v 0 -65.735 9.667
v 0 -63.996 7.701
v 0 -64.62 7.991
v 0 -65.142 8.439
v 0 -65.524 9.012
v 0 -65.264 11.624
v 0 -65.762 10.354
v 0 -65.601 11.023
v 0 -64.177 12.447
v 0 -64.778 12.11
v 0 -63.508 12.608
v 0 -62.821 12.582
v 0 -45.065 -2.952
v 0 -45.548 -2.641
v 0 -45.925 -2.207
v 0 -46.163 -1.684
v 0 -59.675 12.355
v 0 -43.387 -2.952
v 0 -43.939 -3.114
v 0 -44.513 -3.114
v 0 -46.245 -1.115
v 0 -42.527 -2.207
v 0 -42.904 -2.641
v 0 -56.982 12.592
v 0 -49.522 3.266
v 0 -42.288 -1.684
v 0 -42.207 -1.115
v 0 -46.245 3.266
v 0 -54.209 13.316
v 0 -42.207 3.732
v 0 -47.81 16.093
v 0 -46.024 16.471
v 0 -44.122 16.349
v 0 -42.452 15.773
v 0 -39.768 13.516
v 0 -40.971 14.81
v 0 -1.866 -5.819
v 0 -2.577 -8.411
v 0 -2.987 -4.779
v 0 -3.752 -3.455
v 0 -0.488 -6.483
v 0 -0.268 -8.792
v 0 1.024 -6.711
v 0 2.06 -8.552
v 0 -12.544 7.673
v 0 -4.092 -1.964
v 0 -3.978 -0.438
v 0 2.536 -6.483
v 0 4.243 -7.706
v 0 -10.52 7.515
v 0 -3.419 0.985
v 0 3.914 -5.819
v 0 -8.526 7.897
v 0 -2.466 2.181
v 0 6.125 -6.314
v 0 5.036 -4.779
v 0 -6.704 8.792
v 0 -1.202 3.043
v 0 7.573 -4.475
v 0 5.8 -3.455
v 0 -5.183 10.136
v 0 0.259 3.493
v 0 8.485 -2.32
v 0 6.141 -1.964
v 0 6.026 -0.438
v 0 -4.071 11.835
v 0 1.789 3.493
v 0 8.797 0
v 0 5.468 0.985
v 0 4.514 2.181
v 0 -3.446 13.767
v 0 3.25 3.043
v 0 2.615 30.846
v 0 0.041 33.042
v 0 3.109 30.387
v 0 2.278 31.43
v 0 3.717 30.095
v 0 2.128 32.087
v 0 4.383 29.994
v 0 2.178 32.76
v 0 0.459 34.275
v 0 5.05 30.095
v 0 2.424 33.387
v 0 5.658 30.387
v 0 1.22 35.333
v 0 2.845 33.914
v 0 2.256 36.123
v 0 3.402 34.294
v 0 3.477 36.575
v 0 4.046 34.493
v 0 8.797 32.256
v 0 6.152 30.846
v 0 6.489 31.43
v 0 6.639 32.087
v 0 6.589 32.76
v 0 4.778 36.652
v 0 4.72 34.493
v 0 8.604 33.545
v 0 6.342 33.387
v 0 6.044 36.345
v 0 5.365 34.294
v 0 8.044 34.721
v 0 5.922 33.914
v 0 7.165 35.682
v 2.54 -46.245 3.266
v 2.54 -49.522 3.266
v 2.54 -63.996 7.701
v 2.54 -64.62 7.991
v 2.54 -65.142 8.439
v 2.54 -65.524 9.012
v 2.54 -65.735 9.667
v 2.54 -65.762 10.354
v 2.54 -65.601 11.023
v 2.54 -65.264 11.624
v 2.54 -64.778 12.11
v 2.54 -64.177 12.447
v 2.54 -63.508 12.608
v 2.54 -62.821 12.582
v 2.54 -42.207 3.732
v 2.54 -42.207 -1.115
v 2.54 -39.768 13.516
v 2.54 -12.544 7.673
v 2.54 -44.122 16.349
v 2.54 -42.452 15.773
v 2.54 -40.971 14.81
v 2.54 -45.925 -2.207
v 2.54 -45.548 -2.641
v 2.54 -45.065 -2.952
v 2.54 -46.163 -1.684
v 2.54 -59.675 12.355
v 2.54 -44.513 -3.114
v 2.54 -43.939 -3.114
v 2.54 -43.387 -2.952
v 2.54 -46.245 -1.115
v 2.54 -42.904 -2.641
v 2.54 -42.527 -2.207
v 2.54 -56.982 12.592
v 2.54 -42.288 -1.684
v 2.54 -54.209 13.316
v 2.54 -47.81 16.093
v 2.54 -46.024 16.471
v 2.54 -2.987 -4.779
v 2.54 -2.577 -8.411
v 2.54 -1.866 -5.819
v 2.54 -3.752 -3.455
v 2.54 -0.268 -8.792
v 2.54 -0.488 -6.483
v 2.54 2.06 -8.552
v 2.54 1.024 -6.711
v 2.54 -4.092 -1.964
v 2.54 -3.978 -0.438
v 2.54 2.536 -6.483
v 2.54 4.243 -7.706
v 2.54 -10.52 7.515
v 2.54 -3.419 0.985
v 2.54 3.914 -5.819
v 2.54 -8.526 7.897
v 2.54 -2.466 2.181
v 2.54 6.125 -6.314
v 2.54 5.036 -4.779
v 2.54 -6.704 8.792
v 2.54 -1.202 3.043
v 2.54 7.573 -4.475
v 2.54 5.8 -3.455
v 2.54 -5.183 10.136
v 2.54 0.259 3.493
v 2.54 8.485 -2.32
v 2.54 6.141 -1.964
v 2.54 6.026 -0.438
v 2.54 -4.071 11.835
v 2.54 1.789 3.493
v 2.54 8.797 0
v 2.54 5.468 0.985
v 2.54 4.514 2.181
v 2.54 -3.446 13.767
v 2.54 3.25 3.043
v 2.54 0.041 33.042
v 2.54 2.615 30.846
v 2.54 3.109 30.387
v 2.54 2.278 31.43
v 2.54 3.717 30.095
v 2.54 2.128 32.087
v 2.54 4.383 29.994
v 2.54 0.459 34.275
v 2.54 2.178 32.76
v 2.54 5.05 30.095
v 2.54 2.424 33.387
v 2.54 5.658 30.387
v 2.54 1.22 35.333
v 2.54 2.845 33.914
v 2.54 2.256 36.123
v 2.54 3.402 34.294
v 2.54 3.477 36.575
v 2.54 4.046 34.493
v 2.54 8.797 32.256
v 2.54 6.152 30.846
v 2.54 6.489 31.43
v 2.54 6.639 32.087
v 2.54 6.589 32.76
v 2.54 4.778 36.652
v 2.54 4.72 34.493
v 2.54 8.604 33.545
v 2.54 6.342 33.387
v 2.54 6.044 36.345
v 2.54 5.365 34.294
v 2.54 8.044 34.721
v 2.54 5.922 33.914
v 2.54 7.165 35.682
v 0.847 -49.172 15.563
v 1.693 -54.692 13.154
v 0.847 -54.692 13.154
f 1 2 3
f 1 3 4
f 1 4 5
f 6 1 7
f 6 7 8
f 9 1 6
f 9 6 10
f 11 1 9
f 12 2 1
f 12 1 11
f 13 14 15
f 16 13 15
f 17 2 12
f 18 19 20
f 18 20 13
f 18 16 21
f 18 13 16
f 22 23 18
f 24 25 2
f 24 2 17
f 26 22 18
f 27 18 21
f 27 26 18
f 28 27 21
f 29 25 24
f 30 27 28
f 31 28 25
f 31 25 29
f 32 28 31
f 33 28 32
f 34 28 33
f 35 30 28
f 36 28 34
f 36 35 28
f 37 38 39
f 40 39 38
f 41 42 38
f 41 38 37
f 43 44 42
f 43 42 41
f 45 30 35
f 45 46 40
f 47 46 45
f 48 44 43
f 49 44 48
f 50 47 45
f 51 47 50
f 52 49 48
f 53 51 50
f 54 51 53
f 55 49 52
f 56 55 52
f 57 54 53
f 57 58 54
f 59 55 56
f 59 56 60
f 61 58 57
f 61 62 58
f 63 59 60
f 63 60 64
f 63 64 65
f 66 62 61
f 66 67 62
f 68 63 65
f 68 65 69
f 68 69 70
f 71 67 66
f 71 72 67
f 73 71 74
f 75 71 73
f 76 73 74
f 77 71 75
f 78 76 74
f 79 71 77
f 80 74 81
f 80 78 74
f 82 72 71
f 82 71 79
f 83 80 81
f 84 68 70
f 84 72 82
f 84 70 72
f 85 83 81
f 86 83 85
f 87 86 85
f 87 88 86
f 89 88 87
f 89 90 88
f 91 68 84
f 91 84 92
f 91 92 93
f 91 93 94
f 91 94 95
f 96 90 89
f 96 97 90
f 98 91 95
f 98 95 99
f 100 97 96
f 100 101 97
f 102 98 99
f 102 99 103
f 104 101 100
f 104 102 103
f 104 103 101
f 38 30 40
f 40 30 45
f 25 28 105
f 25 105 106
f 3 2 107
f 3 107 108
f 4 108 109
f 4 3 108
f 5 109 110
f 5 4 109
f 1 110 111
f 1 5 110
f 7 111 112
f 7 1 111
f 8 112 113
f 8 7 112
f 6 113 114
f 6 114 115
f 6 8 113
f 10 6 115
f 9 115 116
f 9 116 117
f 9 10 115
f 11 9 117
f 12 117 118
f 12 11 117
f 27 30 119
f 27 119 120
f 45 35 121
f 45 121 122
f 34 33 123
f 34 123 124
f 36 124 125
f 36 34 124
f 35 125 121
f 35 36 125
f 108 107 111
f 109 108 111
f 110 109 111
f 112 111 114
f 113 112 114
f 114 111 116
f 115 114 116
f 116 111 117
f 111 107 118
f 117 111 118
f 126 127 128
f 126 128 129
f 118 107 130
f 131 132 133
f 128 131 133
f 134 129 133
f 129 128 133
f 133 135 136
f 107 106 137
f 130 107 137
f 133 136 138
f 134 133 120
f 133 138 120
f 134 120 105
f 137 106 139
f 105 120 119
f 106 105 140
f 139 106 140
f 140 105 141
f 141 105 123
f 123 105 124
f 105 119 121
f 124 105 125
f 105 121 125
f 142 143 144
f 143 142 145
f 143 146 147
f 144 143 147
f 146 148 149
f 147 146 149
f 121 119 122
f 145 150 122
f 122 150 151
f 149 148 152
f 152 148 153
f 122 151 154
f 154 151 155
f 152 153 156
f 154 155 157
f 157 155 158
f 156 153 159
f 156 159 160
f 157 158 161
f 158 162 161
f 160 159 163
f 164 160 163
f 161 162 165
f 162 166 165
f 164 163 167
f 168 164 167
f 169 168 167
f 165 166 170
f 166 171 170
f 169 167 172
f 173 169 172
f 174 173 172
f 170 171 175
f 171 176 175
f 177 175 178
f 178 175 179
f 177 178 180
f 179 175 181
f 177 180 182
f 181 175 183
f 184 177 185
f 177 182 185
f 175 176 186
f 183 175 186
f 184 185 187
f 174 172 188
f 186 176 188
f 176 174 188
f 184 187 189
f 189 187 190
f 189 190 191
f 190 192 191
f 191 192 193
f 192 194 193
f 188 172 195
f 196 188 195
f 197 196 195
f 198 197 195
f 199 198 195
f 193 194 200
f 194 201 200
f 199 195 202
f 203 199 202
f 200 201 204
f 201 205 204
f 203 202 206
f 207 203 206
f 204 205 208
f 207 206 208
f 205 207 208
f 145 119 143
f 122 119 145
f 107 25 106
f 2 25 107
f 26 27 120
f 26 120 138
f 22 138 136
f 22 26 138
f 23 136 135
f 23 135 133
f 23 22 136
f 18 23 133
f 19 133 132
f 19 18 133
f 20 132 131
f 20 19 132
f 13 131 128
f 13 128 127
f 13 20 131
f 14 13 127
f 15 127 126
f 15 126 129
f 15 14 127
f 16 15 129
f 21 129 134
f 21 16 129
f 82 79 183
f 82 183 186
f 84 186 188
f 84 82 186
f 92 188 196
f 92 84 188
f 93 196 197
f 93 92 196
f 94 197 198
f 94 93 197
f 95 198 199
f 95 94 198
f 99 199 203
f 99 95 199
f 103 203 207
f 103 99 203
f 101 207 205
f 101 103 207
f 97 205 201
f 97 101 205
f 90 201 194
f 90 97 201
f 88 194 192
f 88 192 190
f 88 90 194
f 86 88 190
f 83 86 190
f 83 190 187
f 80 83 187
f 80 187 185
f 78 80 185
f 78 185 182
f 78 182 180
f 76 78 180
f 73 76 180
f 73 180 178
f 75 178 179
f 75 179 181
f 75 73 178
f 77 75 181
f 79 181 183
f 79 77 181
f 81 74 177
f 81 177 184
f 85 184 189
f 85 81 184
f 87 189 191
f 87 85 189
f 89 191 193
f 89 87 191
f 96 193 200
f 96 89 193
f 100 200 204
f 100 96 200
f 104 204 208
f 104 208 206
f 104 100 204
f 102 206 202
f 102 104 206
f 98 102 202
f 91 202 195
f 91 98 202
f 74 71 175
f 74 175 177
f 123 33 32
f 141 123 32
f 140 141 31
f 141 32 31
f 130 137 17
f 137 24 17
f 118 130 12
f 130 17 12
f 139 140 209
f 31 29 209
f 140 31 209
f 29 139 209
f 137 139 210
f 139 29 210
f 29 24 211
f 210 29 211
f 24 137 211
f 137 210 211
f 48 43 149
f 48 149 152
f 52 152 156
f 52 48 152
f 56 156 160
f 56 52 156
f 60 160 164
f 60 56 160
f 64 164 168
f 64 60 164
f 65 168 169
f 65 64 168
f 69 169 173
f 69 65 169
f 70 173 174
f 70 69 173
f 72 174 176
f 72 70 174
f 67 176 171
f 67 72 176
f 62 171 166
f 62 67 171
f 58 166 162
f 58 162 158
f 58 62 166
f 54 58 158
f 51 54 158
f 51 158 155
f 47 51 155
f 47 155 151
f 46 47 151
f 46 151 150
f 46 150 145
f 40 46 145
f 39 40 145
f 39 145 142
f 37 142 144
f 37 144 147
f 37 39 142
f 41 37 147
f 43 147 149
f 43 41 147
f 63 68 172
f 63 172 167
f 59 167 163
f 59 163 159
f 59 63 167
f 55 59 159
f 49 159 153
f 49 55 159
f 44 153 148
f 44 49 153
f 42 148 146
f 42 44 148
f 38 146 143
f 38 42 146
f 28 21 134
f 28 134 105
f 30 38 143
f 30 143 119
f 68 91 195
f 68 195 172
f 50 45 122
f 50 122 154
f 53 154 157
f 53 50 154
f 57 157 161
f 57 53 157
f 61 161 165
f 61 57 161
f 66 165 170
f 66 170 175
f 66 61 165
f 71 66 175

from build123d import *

# Parameters (mm, degrees)
SKETCH1_R           = 5.1308
SKETCH1_R_2         = 2.262010882
BOSS_EXTRUDE1_DEPTH = 2.54


with BuildPart() as part:
    # Sketch1 → Boss-Extrude1 (new body)
    with BuildSketch(Plane(origin=(0, 0, 0), x_dir=(0, 0, -1), z_dir=(1, 0, 0))):
        with BuildLine():
            Line((-32.256192364, 8.796557636), (0, 8.796557636))
            ThreePointArc((0, 8.796557636), (7.072772121, 5.230231425), (8.410616185, -2.577006332))
            Line((8.410616185, -2.577006332), (-3.731873822, -42.206642364))
            Line((-3.731873822, -42.206642364), (1.115138458, -42.206642364))
            ThreePointArc((1.115138458, -42.206642364), (3.134438458, -44.225942364), (1.115138458, -46.245242364))
            Line((1.115138458, -46.245242364), (-3.266361542, -46.245242364))
            Line((-3.266361542, -46.245242364), (-3.266361542, -49.521842364))
            Line((-3.266361542, -49.521842364), (-7.701250082, -63.996057998))
            ThreePointArc((-7.701250082, -63.996057998), (-10.694320166, -65.70408502), (-12.581554006, -62.820654204))
            add(Edge.make_bspline(
                [(-16.349353221, -44.121567363), (-17.528227781, -49.64987319), (-11.082221769, -52.675290574), (-12.581554006, -62.820654204)],
                knots=[0, 0, 0, 0, 1, 1, 1, 1], degree=3))
            ThreePointArc((-16.349353221, -44.121567363), (-15.336629179, -41.682166261), (-13.516414071, -39.768242364))
            Line((-13.516414071, -39.768242364), (-7.67265893, -12.543758648))
            ThreePointArc((-7.67265893, -12.543758648), (-8.792024721, -6.703826274), (-13.766553539, -3.446242364))
            Line((-13.766553539, -3.446242364), (-33.041775294, 0.040539507))
            ThreePointArc((-33.041775294, 0.040539507), (-36.651786579, 4.777676826), (-32.256192364, 8.796557636))
        make_face()
        with Locations((1.580189797, 1.024157636)):
            Circle(SKETCH1_R, mode=Mode.SUBTRACT)
        with Locations((-32.256192364, 4.383307636)):
            Circle(SKETCH1_R_2, mode=Mode.SUBTRACT)
    extrude(amount=BOSS_EXTRUDE1_DEPTH)


solid = part.part
